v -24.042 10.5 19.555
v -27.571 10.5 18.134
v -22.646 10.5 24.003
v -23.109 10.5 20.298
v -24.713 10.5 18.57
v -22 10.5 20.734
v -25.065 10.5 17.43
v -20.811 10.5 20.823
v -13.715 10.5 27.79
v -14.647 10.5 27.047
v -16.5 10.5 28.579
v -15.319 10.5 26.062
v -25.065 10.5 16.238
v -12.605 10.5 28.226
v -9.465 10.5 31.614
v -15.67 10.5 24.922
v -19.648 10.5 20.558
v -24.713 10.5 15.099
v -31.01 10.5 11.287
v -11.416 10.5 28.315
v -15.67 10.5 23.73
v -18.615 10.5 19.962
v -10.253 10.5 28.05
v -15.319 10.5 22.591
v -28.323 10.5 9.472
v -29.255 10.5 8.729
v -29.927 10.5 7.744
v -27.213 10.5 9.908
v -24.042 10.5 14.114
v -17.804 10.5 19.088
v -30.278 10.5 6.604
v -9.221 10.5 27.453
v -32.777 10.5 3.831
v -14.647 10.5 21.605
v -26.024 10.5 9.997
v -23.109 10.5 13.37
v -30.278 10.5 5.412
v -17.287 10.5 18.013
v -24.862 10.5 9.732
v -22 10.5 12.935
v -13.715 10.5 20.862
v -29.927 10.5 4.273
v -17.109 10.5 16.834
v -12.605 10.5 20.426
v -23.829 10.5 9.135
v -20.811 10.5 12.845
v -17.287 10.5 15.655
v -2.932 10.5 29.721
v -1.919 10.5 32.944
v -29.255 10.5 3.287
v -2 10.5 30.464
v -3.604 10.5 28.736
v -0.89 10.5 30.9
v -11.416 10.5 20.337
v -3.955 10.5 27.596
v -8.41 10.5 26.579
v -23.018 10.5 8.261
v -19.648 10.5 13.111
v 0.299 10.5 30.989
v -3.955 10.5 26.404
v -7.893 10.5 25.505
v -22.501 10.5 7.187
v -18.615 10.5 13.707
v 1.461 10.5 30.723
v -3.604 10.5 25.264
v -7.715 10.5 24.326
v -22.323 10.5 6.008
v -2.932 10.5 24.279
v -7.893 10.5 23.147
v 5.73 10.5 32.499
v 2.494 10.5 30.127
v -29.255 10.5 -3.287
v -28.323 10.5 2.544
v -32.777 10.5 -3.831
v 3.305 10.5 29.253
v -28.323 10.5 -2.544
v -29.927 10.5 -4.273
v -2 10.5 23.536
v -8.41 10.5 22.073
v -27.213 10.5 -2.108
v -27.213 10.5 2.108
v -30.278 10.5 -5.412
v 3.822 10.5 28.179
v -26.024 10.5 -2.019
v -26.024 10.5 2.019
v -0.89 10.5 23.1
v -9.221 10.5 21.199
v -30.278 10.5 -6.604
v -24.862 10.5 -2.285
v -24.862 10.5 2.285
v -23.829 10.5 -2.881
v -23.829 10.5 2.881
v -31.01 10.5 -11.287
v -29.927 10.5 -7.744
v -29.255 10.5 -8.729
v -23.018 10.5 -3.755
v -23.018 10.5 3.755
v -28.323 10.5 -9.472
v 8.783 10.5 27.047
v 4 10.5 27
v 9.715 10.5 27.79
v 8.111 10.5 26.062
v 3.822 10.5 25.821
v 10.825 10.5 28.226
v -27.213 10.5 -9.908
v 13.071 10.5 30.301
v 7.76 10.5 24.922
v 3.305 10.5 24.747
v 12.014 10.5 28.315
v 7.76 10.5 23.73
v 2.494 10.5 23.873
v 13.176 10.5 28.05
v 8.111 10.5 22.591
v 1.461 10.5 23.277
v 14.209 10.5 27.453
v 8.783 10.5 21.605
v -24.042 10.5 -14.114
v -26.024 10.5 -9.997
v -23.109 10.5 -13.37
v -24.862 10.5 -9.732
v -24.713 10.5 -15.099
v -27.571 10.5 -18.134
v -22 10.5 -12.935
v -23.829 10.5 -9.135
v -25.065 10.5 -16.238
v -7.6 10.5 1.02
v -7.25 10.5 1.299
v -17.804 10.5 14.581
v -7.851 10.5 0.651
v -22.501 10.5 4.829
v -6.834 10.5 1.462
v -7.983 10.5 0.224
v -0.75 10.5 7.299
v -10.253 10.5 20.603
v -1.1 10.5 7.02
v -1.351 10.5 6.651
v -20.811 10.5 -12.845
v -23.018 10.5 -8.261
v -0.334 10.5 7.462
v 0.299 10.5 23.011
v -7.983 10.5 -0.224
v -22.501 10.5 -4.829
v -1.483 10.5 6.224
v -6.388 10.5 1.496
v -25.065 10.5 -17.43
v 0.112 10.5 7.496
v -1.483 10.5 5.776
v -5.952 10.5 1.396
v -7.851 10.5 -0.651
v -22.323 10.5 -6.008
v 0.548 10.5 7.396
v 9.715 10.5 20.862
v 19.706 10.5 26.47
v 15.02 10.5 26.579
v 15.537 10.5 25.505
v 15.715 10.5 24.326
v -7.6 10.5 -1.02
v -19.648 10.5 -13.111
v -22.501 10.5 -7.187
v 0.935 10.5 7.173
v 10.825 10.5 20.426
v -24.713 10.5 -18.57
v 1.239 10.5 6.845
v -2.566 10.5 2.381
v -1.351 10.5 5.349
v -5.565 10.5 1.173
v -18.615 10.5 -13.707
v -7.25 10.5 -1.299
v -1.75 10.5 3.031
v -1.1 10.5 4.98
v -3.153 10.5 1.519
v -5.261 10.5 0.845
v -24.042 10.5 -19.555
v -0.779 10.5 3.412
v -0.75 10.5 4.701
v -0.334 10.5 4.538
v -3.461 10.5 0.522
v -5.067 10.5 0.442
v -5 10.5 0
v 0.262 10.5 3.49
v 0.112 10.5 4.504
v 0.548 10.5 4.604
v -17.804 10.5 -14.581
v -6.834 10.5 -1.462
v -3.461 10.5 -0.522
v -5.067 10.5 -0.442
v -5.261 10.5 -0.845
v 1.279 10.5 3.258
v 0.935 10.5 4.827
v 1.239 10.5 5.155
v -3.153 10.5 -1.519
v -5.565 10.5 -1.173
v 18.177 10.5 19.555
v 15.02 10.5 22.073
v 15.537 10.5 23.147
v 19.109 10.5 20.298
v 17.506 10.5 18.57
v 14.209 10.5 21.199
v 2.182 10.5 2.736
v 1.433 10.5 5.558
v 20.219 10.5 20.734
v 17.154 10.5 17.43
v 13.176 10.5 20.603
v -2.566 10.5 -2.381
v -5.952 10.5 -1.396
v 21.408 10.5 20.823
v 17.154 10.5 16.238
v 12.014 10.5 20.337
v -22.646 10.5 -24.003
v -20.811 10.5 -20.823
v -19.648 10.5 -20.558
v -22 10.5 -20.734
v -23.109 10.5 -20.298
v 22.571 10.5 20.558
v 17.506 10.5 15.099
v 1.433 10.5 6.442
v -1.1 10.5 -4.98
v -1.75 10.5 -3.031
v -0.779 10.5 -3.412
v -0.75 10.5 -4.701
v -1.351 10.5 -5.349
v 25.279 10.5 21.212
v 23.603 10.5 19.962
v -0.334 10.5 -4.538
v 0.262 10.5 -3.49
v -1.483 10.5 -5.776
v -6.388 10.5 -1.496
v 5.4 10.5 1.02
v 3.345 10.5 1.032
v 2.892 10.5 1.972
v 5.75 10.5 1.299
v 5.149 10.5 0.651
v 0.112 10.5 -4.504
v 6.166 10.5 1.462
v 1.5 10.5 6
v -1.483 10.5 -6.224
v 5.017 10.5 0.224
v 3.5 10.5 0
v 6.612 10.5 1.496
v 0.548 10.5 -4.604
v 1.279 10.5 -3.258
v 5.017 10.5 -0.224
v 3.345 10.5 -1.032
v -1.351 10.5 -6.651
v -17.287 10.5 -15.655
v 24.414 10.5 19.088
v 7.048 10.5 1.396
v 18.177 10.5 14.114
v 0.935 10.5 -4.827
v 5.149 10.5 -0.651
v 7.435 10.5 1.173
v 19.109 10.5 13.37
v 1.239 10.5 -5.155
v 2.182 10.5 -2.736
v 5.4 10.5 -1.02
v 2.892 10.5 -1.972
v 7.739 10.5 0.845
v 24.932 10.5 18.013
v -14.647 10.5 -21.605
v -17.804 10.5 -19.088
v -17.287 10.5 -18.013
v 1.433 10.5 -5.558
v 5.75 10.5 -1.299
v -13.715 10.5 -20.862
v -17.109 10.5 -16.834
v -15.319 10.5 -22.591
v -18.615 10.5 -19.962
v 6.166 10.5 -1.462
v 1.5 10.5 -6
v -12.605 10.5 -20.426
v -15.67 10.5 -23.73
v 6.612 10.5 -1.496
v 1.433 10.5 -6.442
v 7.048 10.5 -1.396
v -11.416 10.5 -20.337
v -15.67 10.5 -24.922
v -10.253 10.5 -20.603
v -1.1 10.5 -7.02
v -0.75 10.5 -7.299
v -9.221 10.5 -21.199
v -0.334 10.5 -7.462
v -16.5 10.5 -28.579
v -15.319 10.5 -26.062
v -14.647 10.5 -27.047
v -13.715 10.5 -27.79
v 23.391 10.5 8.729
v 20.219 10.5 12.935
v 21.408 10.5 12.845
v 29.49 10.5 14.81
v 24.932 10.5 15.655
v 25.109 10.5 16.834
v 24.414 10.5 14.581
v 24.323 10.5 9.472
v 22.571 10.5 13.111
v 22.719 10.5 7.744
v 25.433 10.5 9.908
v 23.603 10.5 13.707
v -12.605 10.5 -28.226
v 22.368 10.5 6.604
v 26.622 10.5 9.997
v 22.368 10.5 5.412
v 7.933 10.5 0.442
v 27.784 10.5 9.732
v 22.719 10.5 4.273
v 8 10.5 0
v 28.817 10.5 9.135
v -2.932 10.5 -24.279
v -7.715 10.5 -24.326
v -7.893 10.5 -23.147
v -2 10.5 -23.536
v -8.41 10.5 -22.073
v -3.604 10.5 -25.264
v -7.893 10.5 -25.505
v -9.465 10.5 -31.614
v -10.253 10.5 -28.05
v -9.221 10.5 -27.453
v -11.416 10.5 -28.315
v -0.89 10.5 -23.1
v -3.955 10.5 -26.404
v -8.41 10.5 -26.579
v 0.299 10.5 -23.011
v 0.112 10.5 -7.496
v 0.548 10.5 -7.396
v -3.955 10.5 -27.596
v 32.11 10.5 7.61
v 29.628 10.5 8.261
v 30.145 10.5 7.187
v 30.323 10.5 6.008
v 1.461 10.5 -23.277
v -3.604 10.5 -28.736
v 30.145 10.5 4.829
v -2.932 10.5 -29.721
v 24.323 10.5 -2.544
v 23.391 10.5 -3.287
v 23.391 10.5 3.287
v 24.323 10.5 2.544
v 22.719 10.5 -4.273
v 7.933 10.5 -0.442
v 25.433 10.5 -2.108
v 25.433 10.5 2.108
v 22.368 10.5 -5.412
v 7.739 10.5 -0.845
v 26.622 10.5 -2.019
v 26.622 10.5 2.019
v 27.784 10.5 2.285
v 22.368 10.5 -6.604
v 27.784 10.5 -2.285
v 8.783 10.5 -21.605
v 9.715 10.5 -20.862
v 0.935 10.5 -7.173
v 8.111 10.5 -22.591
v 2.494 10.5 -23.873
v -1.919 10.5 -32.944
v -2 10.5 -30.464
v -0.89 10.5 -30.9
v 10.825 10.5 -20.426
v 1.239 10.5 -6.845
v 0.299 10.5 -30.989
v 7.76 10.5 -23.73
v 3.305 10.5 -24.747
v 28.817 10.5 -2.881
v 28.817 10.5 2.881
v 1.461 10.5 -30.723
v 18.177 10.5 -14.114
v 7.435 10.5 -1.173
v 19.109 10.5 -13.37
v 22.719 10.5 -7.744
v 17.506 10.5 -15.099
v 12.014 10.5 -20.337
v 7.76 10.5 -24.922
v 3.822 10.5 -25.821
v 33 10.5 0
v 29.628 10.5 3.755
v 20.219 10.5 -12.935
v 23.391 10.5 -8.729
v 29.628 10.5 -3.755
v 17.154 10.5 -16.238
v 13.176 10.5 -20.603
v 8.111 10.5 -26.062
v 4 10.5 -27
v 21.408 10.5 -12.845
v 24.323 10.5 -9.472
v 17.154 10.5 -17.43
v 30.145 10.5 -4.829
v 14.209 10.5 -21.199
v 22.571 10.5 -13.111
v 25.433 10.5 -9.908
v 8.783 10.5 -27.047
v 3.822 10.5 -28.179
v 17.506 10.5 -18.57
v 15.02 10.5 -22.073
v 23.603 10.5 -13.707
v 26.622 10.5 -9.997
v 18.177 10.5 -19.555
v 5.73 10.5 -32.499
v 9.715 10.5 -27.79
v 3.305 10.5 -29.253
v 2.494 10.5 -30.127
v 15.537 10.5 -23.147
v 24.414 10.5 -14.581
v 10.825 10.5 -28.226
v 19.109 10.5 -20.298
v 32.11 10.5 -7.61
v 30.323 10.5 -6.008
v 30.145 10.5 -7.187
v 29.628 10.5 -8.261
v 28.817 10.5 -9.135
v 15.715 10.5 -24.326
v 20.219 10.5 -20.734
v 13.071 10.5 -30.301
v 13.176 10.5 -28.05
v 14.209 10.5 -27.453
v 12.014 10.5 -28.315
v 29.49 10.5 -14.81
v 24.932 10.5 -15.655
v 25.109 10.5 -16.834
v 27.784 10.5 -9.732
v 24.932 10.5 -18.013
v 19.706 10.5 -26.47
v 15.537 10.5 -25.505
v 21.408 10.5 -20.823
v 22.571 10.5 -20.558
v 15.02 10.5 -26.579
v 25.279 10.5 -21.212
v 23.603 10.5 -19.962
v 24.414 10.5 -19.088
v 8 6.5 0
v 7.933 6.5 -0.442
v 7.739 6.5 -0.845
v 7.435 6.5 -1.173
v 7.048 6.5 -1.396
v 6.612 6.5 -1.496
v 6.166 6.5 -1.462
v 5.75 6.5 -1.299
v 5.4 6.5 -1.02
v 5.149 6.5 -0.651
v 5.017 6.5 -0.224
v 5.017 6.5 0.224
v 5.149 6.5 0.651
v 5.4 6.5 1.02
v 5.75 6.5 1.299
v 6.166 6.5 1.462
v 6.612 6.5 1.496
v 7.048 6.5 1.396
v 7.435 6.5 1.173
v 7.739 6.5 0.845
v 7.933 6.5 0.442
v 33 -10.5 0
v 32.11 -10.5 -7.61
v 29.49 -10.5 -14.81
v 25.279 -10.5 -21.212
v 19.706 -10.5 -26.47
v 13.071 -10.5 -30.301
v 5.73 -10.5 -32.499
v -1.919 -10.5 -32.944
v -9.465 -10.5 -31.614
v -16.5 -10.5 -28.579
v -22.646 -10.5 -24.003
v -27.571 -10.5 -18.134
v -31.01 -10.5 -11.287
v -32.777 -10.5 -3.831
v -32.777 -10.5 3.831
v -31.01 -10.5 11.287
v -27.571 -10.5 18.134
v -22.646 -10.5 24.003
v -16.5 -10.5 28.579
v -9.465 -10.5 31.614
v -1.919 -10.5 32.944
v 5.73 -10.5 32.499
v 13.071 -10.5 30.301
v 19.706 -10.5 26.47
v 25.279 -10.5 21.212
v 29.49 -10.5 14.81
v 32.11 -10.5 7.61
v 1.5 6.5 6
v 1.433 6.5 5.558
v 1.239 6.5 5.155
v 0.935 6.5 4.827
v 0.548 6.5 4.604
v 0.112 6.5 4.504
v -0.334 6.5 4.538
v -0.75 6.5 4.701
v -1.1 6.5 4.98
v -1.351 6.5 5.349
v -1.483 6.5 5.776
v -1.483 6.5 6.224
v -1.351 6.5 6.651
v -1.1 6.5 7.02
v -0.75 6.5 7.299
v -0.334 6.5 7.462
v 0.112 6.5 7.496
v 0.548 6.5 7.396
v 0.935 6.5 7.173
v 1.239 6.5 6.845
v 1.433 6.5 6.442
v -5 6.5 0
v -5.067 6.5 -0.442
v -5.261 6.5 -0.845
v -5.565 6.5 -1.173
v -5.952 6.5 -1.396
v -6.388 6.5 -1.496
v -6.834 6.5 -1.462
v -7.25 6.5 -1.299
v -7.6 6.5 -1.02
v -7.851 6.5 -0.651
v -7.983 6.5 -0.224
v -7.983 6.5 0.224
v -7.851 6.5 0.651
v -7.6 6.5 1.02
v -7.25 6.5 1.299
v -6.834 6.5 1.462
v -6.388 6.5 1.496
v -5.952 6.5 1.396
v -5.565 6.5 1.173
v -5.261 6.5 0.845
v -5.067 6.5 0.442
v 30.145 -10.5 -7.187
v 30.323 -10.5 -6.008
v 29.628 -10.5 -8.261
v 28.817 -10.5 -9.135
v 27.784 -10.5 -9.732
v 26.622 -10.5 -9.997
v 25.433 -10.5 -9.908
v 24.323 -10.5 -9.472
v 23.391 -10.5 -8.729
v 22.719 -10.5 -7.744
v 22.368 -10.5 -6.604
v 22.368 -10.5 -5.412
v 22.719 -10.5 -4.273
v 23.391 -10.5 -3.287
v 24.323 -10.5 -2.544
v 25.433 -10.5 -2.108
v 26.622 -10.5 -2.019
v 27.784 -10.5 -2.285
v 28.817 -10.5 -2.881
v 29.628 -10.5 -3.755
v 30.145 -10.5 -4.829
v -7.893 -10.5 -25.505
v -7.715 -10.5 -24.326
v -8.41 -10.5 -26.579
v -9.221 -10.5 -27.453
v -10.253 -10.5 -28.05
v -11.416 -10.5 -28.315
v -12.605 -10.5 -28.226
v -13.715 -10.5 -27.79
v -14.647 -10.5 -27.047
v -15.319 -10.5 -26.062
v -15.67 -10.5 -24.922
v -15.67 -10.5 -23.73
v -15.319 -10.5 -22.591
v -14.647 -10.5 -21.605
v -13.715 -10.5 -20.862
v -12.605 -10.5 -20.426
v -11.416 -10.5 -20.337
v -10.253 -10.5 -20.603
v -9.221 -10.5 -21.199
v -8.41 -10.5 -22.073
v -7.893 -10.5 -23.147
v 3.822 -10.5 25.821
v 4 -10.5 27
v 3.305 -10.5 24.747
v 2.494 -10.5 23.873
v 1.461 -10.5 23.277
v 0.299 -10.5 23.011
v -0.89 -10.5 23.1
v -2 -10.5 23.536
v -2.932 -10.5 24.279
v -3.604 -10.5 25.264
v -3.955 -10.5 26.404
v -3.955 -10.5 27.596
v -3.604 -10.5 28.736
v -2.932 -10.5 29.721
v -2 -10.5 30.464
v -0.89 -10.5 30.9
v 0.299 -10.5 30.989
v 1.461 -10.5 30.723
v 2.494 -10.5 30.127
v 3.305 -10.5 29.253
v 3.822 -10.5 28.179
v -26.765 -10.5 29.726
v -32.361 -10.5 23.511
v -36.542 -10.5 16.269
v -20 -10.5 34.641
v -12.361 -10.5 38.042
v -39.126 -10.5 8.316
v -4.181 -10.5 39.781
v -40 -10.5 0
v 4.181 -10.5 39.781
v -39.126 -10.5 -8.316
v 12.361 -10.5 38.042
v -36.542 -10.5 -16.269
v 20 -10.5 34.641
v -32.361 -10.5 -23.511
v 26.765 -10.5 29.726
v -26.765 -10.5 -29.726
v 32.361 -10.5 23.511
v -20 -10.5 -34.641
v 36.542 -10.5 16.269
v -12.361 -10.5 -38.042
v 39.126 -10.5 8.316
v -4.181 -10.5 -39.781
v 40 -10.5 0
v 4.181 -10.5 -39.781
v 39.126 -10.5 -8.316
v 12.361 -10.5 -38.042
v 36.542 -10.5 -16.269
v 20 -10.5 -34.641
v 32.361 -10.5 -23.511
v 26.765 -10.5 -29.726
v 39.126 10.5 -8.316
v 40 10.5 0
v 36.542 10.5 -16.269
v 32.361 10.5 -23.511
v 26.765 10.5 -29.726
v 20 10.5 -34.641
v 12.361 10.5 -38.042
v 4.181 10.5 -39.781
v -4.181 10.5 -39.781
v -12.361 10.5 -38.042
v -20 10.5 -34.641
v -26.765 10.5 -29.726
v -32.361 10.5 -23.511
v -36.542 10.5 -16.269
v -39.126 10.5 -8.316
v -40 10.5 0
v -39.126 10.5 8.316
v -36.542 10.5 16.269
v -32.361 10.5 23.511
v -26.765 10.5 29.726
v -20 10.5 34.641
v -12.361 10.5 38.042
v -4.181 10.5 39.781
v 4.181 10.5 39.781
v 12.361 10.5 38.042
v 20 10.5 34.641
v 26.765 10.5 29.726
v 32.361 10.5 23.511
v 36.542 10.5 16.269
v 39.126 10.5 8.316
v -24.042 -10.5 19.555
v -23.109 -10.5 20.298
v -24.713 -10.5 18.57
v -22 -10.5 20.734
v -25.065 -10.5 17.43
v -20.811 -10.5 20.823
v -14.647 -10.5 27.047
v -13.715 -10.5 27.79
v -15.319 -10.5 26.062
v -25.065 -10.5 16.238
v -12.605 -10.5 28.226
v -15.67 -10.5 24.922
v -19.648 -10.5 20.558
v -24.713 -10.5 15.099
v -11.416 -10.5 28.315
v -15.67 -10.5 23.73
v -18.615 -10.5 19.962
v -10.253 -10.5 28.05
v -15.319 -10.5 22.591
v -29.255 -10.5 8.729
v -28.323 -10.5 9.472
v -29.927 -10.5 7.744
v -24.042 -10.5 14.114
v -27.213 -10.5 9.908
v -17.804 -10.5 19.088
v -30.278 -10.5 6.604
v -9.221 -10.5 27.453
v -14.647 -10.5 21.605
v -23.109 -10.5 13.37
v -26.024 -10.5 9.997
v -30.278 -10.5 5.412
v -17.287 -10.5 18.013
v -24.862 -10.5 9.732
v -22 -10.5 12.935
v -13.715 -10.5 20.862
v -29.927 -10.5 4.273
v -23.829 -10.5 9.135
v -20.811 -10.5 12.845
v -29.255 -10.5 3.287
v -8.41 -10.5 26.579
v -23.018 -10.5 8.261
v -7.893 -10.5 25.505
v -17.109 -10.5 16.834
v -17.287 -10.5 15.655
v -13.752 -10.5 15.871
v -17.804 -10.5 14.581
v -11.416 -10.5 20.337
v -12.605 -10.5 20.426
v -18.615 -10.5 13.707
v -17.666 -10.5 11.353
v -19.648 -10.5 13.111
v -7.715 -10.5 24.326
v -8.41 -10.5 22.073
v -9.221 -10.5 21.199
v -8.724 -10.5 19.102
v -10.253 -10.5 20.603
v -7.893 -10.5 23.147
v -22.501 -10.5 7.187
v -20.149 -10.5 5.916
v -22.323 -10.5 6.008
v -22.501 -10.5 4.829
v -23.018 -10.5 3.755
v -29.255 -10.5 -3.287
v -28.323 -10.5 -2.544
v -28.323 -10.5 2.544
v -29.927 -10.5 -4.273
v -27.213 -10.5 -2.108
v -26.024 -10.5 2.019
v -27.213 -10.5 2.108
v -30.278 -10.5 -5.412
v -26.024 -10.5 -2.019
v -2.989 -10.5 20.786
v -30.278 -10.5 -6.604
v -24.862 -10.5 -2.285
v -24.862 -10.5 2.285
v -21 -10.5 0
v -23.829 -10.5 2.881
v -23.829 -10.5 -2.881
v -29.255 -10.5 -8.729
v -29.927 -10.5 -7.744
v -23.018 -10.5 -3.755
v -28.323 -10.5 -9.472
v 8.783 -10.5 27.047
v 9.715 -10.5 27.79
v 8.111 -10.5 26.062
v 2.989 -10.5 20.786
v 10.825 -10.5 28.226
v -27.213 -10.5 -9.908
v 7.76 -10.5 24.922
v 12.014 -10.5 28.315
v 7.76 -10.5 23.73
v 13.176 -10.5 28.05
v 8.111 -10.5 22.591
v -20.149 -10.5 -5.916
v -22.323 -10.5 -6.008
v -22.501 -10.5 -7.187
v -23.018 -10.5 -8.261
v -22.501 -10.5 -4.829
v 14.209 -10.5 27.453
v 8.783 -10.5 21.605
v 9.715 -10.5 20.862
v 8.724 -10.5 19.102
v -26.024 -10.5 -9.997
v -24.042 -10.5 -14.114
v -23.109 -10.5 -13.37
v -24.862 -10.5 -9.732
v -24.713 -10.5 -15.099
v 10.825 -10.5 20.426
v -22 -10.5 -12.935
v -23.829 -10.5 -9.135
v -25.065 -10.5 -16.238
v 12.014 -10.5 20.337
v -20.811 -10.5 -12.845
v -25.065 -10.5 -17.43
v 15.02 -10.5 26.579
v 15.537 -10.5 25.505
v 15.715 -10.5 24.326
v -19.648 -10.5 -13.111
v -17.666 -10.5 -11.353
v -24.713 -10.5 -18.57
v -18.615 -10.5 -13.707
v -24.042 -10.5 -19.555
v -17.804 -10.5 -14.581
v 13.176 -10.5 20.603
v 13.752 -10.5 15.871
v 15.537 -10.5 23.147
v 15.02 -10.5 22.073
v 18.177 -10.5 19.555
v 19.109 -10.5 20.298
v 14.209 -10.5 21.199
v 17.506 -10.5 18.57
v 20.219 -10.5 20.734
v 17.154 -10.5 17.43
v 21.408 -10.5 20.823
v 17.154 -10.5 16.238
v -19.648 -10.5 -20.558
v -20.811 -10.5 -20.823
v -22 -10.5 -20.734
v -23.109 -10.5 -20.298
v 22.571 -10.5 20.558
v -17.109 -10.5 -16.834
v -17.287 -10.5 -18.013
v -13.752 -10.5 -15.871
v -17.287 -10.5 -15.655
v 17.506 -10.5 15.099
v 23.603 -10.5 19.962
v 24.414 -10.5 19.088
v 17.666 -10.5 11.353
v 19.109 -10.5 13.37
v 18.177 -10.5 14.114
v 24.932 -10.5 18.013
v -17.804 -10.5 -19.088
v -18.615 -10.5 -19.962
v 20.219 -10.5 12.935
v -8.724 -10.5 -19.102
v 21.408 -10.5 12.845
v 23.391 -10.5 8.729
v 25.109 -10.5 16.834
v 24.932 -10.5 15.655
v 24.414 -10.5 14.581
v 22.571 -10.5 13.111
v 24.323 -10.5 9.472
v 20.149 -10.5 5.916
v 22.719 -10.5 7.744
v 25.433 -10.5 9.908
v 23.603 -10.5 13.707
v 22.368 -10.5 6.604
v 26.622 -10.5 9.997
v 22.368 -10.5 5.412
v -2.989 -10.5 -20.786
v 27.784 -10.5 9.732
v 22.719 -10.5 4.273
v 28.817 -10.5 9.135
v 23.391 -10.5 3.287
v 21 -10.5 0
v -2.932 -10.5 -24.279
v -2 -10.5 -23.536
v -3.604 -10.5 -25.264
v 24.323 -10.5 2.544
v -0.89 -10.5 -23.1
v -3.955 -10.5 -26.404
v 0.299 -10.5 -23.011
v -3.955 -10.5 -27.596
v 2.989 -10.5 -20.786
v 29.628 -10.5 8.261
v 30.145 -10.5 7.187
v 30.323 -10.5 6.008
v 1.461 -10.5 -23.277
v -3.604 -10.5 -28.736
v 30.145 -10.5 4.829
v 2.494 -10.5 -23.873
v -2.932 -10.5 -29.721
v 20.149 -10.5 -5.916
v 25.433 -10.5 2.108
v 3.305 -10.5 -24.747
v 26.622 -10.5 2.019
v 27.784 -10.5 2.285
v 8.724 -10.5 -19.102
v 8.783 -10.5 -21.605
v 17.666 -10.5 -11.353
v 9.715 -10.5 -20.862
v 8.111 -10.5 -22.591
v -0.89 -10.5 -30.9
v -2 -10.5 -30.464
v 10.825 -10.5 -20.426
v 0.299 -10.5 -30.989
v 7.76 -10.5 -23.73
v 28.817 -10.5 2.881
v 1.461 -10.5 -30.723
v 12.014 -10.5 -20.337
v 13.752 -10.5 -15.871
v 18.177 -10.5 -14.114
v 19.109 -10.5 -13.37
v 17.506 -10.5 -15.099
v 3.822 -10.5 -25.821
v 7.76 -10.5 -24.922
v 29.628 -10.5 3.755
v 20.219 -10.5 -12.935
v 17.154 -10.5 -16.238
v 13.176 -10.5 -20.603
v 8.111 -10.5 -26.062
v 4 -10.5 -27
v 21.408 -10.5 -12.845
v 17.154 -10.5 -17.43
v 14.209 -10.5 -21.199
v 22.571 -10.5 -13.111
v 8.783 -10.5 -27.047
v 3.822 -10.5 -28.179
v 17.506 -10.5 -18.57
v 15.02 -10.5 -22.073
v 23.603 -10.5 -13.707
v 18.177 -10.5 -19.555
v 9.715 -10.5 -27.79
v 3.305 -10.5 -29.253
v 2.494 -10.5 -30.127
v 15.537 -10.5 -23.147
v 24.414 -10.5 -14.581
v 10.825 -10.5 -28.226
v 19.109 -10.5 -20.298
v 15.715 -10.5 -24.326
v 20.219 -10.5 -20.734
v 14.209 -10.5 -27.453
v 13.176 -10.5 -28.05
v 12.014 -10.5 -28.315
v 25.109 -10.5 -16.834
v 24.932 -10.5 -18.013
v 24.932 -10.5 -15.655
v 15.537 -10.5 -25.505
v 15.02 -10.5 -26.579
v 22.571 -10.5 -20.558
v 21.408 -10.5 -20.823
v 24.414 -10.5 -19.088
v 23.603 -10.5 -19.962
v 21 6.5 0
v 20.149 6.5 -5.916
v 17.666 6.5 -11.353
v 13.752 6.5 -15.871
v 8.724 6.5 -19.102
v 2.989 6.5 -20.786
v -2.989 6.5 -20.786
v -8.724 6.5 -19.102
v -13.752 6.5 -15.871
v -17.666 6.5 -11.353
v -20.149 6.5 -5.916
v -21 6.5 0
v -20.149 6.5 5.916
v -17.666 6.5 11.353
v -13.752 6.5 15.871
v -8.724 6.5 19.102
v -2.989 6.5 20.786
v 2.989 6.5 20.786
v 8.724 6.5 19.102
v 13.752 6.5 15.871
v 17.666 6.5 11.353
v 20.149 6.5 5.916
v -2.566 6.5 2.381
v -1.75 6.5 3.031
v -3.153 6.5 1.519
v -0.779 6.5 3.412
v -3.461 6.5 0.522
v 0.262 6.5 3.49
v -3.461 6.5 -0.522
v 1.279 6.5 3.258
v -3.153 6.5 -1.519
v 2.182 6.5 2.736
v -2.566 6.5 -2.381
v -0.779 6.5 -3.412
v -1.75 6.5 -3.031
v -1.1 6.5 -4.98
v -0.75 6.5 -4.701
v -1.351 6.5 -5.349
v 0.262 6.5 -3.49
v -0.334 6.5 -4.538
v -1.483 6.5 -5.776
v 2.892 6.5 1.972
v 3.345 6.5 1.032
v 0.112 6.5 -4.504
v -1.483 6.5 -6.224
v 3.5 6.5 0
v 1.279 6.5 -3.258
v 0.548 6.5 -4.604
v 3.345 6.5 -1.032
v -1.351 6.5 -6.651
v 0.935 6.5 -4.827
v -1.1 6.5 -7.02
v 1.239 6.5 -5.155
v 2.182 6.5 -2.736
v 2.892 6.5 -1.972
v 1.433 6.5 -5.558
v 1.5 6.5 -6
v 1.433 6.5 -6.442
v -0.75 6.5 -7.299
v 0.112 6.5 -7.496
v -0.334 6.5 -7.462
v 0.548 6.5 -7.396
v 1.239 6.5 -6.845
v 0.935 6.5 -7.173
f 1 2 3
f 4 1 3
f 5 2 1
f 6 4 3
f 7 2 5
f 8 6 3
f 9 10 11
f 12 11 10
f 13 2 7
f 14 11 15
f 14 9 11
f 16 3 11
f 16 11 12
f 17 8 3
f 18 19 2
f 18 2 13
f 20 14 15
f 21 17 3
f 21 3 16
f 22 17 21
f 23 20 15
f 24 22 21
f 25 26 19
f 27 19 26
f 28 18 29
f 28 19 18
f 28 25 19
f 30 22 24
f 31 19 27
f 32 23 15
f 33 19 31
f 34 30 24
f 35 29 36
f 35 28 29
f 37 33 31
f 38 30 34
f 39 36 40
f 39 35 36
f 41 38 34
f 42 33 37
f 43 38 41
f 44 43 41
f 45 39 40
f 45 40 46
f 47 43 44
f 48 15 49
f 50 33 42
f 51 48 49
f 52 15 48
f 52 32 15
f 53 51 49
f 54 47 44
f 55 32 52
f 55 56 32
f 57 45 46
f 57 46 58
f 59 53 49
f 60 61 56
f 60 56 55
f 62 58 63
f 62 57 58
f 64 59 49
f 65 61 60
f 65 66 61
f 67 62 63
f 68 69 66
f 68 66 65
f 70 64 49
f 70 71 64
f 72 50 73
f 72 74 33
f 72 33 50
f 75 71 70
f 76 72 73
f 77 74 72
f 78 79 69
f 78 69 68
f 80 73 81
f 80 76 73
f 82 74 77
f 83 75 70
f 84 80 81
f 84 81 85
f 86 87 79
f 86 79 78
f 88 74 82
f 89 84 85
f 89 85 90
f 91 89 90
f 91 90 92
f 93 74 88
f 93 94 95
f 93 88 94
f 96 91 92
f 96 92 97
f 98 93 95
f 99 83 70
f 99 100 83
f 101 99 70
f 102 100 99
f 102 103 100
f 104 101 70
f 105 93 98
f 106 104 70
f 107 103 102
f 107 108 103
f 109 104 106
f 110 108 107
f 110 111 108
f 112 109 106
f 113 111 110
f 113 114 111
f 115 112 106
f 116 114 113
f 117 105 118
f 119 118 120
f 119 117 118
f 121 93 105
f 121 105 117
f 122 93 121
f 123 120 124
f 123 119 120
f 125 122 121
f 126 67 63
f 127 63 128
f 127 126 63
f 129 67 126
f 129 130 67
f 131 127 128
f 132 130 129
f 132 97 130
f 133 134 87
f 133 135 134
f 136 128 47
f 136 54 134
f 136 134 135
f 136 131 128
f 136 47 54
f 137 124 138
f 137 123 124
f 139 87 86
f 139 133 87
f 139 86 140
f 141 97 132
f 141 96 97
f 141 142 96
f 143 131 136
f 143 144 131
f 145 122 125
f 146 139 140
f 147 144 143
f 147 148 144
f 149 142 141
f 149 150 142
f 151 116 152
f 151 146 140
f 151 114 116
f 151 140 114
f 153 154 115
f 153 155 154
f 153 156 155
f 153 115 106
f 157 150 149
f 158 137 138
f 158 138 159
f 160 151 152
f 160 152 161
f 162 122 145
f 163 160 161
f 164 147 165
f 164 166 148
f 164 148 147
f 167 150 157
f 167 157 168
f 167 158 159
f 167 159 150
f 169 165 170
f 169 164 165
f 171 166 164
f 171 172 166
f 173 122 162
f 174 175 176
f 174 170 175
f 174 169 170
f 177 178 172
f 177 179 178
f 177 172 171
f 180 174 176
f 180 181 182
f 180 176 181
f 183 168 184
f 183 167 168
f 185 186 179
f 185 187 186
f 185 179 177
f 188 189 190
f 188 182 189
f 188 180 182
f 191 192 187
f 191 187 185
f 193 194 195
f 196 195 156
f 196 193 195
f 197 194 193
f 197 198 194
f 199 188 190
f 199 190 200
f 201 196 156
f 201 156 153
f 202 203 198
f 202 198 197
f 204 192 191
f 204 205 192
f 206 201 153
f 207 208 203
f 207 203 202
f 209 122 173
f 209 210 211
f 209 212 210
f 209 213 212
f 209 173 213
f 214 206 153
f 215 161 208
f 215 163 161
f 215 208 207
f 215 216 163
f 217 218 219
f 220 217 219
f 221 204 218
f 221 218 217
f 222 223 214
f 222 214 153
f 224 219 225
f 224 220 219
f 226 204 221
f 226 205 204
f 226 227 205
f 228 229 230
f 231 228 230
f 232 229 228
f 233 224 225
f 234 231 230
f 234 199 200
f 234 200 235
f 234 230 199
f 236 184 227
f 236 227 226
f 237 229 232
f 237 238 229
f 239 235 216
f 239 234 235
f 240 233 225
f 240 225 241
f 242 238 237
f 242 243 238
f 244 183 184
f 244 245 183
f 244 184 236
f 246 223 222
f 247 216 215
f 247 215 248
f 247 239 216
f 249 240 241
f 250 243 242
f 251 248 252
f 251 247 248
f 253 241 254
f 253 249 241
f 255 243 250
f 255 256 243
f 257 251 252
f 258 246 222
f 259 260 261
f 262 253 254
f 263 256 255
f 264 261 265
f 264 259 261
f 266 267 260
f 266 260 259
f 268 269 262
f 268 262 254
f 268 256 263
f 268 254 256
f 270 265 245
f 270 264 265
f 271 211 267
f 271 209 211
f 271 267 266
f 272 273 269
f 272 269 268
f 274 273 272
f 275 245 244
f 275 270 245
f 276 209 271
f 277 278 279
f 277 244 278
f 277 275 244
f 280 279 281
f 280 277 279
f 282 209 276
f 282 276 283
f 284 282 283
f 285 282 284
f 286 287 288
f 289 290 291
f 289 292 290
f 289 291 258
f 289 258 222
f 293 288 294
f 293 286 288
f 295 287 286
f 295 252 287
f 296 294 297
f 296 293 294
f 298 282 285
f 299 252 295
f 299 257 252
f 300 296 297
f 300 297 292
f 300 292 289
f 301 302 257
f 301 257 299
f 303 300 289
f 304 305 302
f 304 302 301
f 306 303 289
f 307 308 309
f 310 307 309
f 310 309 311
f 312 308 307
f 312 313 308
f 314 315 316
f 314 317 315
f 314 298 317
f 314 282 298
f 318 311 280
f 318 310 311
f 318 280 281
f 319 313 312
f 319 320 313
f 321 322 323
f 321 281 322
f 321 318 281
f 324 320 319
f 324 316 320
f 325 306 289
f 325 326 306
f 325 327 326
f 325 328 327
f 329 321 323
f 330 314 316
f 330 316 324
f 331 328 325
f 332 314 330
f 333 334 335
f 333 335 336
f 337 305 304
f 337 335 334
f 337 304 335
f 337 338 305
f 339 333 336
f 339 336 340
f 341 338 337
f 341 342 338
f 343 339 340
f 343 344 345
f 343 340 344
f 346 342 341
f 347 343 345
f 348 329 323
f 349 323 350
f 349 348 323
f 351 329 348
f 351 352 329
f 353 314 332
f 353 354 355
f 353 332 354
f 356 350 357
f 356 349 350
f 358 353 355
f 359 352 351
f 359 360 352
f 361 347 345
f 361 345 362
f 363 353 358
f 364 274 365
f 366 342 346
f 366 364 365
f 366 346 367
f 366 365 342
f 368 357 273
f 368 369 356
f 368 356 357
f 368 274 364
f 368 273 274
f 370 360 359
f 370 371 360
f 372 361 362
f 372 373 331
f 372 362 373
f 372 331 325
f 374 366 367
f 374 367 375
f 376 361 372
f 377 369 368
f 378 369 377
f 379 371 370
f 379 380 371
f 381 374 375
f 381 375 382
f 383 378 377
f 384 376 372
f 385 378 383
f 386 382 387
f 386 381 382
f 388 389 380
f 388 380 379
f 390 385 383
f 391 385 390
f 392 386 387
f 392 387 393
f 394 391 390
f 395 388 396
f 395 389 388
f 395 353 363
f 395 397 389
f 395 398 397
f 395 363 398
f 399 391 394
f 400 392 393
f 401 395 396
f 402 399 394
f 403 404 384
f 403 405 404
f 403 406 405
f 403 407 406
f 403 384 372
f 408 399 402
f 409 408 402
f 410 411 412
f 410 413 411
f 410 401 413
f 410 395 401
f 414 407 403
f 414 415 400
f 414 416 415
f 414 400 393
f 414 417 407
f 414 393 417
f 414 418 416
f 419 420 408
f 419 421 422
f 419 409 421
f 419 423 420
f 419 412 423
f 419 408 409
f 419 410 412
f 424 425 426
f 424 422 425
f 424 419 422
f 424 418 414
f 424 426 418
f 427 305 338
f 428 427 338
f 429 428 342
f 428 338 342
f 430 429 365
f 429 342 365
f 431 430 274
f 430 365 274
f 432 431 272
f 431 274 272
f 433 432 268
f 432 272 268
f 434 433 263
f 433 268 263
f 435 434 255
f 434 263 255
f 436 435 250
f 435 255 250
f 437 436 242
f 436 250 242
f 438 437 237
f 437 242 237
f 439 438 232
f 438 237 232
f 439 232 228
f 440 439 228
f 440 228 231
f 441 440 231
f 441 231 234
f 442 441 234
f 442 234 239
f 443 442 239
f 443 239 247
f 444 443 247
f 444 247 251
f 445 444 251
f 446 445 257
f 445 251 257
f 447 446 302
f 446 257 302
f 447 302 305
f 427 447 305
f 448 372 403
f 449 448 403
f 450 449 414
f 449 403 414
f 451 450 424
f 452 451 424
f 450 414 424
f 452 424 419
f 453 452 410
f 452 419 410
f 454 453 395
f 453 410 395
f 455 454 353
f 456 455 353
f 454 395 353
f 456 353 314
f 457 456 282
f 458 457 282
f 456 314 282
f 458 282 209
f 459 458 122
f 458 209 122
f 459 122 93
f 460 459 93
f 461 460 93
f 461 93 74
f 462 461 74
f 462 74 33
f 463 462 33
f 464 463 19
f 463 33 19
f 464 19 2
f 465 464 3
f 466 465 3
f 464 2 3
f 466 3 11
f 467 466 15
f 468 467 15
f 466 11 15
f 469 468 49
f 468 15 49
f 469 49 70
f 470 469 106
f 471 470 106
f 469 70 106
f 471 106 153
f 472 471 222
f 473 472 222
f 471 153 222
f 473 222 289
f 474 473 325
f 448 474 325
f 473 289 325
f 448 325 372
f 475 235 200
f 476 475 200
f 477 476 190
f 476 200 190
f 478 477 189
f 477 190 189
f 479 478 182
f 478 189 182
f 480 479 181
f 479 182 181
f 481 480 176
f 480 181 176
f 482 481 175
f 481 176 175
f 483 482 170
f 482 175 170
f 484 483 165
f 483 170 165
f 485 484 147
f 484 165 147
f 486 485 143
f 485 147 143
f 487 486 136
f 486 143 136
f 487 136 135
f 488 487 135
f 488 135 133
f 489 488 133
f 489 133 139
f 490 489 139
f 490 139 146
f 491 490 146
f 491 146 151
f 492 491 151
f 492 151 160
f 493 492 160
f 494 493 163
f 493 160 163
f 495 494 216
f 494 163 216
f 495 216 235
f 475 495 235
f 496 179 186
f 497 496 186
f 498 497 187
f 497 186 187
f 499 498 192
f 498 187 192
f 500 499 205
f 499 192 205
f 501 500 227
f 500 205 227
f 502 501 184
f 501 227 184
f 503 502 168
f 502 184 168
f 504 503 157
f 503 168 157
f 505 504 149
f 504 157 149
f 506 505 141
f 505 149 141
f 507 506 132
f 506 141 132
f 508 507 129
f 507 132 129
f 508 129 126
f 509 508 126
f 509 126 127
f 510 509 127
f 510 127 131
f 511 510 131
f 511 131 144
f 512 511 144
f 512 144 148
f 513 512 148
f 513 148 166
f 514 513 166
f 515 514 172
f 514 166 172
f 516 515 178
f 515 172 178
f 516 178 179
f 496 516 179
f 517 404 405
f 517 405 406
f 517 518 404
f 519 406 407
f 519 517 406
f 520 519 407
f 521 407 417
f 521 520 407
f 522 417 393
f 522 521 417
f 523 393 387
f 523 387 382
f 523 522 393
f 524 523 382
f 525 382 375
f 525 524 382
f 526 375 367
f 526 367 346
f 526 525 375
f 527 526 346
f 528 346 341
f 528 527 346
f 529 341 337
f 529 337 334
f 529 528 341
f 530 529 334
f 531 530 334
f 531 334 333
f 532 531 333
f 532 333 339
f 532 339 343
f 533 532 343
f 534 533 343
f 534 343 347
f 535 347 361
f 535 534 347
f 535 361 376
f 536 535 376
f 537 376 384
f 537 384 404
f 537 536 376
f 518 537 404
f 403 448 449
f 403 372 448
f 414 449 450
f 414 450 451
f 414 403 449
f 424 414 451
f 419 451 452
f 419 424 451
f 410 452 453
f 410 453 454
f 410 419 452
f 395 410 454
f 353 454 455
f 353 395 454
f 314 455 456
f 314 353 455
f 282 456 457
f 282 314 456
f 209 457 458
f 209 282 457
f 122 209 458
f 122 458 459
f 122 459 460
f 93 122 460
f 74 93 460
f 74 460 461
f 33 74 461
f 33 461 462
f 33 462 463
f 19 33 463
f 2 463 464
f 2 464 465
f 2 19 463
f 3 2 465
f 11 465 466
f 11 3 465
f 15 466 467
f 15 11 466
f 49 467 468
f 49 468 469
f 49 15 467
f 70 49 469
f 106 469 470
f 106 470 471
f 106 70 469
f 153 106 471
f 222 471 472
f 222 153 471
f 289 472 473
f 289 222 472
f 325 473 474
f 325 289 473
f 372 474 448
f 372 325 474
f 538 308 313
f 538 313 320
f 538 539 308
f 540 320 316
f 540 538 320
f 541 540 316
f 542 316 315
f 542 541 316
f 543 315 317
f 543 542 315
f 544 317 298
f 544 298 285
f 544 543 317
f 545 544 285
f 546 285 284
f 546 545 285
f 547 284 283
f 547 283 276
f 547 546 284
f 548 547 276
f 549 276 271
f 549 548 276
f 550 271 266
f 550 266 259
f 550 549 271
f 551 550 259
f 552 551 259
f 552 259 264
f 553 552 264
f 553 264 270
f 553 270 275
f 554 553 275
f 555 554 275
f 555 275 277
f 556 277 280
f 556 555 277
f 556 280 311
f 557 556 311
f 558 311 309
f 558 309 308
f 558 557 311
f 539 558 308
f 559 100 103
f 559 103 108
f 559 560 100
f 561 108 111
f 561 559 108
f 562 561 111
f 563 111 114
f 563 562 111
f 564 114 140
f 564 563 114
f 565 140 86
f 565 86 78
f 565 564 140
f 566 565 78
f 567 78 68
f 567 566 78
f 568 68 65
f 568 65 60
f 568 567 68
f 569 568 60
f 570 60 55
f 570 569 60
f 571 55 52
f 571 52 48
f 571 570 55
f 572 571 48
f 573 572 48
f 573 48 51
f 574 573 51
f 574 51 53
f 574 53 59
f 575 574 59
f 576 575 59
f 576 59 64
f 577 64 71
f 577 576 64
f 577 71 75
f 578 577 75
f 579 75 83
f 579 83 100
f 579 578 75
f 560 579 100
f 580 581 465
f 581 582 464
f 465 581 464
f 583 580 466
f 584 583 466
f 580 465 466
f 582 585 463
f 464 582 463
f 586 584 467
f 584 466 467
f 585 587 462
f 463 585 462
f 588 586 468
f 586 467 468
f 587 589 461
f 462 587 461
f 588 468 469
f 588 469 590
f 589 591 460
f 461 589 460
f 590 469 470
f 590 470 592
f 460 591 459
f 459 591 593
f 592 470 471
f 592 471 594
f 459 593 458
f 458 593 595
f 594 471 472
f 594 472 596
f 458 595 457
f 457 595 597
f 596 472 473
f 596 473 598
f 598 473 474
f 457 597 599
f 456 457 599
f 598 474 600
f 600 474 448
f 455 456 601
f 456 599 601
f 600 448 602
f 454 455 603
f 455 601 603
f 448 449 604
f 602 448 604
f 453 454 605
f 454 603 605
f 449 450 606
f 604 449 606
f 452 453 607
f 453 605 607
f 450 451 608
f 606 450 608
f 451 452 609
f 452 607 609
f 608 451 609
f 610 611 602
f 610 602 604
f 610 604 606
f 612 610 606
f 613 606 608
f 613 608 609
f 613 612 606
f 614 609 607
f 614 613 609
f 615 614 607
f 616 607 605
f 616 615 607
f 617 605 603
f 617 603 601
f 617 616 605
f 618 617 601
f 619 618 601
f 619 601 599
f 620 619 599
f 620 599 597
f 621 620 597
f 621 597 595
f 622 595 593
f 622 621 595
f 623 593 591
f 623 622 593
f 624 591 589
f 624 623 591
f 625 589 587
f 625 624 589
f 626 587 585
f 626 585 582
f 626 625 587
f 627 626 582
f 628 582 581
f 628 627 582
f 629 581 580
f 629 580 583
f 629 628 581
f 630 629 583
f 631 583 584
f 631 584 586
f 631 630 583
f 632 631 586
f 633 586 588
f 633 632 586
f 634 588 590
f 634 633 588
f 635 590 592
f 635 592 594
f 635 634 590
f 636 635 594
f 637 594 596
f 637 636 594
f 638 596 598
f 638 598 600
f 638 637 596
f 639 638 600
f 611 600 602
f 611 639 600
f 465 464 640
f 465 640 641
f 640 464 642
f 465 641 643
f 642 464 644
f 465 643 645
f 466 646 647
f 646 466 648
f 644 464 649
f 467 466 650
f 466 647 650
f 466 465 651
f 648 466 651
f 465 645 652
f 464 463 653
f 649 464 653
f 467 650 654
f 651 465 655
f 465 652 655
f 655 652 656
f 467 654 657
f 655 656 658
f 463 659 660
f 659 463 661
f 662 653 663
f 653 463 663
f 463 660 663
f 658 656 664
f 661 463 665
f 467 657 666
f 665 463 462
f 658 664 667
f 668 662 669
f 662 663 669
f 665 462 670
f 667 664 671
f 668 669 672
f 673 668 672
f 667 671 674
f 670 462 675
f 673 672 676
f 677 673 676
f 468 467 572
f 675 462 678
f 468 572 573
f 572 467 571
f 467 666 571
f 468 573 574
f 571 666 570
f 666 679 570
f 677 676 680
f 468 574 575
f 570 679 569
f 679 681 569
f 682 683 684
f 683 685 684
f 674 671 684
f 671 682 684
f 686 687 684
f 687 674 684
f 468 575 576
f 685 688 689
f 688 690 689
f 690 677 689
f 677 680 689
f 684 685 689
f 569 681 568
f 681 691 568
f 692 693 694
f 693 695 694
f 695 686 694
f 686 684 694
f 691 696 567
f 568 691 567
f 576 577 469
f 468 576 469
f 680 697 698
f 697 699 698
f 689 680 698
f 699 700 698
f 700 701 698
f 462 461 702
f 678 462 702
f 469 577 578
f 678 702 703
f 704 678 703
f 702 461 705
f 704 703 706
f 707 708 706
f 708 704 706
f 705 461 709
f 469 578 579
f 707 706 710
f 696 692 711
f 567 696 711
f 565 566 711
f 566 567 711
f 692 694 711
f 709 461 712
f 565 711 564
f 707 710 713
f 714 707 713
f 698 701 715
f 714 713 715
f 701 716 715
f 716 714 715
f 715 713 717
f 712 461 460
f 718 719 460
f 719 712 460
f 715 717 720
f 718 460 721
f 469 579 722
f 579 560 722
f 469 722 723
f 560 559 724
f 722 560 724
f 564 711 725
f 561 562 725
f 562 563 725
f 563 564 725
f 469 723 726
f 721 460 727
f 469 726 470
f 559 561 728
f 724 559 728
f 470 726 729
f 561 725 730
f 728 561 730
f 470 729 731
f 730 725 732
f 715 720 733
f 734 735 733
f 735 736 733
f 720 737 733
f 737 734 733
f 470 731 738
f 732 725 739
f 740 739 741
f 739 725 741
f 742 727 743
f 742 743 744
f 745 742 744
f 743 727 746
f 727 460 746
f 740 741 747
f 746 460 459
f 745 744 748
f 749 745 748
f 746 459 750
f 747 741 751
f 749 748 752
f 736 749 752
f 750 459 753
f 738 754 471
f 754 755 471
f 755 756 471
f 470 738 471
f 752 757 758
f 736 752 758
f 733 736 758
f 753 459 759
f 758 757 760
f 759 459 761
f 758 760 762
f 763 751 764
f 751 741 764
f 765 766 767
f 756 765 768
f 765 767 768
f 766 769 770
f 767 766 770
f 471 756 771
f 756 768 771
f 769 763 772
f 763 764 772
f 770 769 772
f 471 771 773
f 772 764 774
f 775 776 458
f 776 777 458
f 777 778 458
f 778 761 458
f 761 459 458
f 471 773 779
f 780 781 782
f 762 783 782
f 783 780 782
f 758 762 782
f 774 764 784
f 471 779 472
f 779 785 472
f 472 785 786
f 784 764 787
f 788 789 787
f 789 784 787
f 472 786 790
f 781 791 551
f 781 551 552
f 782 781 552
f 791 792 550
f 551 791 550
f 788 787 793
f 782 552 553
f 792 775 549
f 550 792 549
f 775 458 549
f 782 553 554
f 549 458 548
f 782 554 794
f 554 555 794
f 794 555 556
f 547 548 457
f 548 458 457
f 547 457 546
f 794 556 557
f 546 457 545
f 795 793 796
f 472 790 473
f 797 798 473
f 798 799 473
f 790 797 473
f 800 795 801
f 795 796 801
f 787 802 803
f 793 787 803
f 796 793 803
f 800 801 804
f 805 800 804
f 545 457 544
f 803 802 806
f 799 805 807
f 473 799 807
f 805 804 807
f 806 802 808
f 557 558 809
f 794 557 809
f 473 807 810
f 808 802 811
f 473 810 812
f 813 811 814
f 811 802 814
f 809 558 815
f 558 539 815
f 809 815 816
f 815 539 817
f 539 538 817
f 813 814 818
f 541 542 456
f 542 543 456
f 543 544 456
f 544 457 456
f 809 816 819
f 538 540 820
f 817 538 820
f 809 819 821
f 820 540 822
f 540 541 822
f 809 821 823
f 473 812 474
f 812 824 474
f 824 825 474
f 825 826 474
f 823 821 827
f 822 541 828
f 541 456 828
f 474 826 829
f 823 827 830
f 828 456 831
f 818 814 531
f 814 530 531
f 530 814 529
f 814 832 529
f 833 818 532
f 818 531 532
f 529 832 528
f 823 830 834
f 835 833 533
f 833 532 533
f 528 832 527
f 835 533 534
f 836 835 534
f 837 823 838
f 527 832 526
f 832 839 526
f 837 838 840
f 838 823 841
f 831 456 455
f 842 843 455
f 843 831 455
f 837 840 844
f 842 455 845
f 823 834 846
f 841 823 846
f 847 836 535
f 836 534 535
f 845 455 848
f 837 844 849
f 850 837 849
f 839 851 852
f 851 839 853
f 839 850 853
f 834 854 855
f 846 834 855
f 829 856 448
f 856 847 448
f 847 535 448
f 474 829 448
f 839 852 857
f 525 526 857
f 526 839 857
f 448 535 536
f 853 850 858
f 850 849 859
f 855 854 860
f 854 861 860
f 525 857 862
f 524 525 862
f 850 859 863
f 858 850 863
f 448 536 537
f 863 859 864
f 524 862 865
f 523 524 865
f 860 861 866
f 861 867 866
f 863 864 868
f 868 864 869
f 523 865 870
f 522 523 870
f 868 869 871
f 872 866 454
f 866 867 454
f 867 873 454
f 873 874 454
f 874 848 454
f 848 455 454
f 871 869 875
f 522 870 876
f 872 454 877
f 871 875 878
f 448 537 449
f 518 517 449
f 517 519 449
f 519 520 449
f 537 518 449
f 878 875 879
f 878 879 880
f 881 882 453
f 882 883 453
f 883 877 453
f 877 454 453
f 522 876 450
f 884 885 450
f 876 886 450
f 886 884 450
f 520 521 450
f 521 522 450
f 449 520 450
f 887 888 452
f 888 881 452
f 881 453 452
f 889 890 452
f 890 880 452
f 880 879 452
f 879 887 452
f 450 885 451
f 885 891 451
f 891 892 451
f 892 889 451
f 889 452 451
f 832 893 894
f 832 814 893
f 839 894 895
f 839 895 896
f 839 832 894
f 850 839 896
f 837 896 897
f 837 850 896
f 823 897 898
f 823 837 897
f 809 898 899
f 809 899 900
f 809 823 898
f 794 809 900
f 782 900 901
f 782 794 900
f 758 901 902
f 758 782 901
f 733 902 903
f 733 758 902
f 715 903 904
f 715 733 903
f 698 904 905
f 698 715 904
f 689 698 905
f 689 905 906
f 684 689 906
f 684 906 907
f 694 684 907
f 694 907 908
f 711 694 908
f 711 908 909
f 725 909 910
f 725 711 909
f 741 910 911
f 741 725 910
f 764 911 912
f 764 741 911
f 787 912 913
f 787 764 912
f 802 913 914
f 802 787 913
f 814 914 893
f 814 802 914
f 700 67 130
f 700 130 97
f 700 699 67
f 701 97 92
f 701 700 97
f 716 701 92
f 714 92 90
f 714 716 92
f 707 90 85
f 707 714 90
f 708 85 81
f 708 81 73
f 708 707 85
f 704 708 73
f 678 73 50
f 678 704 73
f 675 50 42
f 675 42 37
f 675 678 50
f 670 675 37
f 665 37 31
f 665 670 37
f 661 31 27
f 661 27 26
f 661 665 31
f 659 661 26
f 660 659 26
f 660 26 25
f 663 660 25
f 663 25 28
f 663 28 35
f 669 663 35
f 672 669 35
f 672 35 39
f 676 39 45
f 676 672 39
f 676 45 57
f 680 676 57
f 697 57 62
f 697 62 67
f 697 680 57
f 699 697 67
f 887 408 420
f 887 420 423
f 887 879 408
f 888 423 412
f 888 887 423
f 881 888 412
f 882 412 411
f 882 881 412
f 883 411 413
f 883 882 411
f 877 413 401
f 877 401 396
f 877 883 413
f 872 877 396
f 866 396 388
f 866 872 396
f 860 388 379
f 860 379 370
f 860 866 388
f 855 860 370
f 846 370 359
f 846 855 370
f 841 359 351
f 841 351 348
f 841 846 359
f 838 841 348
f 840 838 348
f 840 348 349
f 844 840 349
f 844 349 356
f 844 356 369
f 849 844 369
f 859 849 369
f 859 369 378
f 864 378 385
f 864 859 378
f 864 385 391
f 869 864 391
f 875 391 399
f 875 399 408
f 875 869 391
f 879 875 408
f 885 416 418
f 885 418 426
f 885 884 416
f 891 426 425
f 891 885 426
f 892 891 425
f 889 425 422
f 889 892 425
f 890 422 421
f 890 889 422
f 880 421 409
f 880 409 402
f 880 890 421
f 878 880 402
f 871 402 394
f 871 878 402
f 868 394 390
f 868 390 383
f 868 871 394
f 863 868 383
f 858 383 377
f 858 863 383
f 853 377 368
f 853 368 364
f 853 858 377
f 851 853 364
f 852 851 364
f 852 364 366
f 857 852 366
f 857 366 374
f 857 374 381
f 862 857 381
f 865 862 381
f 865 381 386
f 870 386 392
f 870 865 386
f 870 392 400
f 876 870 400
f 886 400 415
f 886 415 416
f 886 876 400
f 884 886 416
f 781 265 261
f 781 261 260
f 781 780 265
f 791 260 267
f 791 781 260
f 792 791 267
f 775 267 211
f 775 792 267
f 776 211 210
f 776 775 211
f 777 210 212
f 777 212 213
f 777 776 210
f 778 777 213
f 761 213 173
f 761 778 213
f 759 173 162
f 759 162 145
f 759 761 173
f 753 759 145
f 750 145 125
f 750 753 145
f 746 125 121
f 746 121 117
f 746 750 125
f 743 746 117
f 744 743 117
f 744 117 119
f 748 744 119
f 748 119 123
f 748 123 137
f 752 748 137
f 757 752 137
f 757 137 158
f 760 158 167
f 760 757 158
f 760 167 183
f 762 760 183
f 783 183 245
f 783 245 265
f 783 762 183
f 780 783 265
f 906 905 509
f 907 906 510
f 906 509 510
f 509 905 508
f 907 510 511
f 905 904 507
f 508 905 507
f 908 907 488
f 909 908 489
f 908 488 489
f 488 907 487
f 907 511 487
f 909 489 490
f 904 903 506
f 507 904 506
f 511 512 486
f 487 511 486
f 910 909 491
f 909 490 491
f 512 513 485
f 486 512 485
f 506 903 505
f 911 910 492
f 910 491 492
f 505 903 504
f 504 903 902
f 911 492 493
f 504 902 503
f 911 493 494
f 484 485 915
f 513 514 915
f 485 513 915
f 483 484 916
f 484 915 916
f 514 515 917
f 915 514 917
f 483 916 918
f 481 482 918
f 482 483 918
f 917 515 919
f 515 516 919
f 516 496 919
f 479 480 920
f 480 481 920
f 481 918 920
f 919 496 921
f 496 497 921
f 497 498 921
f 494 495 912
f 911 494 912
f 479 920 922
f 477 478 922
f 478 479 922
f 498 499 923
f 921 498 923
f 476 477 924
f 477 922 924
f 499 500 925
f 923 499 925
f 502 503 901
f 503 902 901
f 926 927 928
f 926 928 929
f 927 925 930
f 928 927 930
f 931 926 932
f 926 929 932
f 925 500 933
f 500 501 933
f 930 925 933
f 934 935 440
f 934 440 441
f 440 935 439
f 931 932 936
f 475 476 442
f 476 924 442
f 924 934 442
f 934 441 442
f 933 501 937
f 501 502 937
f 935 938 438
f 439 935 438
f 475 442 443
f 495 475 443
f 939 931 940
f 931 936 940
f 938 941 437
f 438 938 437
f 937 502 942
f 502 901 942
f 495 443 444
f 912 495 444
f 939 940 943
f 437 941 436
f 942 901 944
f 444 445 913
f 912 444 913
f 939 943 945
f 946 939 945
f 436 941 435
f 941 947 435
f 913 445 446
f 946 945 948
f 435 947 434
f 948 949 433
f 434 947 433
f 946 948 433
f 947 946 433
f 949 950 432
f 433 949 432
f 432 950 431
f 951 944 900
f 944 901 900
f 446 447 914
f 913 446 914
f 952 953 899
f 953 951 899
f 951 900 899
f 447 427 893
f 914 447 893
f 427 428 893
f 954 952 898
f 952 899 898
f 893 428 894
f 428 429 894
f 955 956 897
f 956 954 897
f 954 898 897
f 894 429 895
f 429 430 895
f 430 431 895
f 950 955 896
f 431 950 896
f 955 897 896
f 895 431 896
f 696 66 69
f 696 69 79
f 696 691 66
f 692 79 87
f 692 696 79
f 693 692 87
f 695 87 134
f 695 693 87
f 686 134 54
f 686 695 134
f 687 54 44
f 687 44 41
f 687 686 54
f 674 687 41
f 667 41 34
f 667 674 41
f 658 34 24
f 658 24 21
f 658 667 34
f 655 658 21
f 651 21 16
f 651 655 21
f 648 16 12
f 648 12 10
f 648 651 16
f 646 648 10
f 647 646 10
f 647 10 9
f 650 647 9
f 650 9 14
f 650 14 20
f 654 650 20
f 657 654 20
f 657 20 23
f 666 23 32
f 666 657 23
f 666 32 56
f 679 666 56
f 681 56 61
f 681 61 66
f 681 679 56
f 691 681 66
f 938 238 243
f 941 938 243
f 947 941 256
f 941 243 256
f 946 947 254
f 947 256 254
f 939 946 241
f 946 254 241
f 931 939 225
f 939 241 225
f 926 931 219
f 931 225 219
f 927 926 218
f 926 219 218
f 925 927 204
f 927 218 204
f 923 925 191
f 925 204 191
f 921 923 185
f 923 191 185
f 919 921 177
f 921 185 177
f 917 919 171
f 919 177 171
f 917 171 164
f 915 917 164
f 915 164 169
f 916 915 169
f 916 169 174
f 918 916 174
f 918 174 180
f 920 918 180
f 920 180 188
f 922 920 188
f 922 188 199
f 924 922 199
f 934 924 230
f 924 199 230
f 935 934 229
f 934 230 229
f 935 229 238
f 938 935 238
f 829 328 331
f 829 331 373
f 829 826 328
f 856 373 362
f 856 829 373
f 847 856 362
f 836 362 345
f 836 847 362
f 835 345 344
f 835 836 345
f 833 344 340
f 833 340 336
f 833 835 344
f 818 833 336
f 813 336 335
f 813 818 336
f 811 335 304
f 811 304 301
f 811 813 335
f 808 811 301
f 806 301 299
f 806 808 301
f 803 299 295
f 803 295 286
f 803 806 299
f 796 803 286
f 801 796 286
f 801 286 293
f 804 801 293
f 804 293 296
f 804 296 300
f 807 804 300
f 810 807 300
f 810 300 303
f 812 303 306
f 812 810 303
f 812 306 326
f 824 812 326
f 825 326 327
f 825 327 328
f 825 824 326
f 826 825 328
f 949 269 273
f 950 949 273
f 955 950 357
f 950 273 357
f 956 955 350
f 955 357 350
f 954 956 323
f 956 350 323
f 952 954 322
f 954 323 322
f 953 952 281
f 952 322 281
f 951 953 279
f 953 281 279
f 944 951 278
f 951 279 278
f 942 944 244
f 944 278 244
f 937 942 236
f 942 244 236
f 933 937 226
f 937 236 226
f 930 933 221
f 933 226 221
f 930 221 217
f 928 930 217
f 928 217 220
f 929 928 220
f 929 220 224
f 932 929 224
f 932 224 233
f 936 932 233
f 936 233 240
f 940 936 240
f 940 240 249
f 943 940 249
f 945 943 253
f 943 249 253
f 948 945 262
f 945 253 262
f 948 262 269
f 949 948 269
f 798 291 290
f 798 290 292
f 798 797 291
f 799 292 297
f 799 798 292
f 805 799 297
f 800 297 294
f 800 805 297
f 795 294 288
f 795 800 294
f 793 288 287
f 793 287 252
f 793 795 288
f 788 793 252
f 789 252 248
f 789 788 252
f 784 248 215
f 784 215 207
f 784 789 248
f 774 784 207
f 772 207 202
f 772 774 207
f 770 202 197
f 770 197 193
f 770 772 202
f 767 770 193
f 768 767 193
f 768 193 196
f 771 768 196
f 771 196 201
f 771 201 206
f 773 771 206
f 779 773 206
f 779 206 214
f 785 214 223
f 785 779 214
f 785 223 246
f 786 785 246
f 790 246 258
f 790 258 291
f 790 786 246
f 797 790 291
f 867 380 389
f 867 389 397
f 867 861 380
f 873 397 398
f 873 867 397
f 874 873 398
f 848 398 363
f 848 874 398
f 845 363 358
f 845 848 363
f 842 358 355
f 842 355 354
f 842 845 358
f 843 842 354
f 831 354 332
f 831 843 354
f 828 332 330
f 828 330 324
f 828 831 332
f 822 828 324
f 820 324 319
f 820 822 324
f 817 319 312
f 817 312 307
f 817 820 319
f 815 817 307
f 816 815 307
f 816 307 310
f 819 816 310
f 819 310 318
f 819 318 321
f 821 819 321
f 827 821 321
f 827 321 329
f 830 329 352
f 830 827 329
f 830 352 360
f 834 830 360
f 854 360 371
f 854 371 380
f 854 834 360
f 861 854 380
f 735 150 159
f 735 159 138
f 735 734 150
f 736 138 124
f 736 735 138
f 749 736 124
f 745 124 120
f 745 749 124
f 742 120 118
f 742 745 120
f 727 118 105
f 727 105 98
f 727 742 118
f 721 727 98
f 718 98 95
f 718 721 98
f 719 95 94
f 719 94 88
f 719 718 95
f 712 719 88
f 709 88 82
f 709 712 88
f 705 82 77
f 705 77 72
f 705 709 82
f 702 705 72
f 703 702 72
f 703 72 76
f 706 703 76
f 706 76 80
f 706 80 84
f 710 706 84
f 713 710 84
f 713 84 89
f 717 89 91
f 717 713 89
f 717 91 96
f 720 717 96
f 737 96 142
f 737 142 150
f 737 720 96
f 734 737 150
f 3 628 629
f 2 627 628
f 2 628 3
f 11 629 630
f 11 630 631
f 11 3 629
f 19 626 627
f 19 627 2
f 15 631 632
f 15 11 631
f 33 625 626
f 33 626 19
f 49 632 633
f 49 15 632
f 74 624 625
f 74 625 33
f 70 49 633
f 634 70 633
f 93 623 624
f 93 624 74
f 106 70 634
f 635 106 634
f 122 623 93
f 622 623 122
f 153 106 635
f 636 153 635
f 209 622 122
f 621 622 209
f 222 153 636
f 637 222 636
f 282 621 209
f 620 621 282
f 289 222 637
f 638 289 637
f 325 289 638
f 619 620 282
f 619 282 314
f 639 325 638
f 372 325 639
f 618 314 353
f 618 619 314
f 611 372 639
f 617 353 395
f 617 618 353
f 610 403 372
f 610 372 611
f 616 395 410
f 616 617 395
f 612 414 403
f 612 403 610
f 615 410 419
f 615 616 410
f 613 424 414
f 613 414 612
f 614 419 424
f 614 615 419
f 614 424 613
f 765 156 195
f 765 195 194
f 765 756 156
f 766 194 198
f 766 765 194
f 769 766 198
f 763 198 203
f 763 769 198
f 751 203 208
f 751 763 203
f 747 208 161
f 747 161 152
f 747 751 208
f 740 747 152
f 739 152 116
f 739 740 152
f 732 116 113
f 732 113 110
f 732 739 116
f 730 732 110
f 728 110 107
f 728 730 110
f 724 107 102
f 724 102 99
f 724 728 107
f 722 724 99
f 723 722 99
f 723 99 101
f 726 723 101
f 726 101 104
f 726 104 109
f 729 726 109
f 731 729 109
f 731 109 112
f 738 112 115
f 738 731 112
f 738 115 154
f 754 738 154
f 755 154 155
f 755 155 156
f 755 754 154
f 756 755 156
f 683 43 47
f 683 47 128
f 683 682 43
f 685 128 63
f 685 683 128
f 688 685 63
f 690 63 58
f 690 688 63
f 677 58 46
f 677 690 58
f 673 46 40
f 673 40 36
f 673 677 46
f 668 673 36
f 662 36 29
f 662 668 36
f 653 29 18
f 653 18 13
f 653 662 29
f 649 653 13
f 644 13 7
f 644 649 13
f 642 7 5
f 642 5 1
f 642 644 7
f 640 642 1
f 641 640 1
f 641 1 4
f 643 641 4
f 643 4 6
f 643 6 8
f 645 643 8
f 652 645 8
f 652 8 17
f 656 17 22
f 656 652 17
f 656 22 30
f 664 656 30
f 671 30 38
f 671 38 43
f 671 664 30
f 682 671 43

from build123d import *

# Parameters (mm, degrees)
SKETCH_1_R      = 33
SKETCH_1_R_2    = 21
SKETCH_1_R_3    = 4
EXTRUDE_1_DEPTH = 10.5
SKETCH_2_R      = 21
SKETCH_2_R_2    = 1.5
SKETCH_2_R_3    = 3.5
EXTRUDE_2_DEPTH = 4
SKETCH_3_R      = 40
SKETCH_3_R_2    = 33
EXTRUDE_3_DEPTH = 21


with BuildPart() as part:
    # 草图1 → 凸台-拉伸1 (new body, symmetric)
    with BuildSketch(Plane(origin=(0, 0, 0), x_dir=(1, 0, 0), z_dir=(0, 1, 0))):
        Circle(SKETCH_1_R)
        Circle(SKETCH_1_R_2, mode=Mode.SUBTRACT)
        with Locations((0, 27)):
            Circle(SKETCH_1_R_3, mode=Mode.SUBTRACT)
        with Locations((11.714860956, 24.326159433)):
            Circle(SKETCH_1_R_3, mode=Mode.SUBTRACT)
        with Locations((21.109450027, 16.83422465)):
            Circle(SKETCH_1_R_3, mode=Mode.SUBTRACT)
        with Locations((26.323053629, 6.008065217)):
            Circle(SKETCH_1_R_3, mode=Mode.SUBTRACT)
        with Locations((26.323053629, -6.008065217)):
            Circle(SKETCH_1_R_3, mode=Mode.SUBTRACT)
        with Locations((21.109450027, -16.83422465)):
            Circle(SKETCH_1_R_3, mode=Mode.SUBTRACT)
        with Locations((11.714860956, -24.326159433)):
            Circle(SKETCH_1_R_3, mode=Mode.SUBTRACT)
        with Locations((0, -27)):
            Circle(SKETCH_1_R_3, mode=Mode.SUBTRACT)
        with Locations((-11.714860956, -24.326159433)):
            Circle(SKETCH_1_R_3, mode=Mode.SUBTRACT)
        with Locations((-21.109450027, -16.83422465)):
            Circle(SKETCH_1_R_3, mode=Mode.SUBTRACT)
        with Locations((-26.323053629, -6.008065217)):
            Circle(SKETCH_1_R_3, mode=Mode.SUBTRACT)
        with Locations((-26.323053629, 6.008065217)):
            Circle(SKETCH_1_R_3, mode=Mode.SUBTRACT)
        with Locations((-21.109450027, 16.83422465)):
            Circle(SKETCH_1_R_3, mode=Mode.SUBTRACT)
        with Locations((-11.714860956, 24.326159433)):
            Circle(SKETCH_1_R_3, mode=Mode.SUBTRACT)
    extrude(amount=EXTRUDE_1_DEPTH, both=True)

    # 草图2 → 凸台-拉伸2 (add)
    with BuildSketch(Plane(origin=(0, 10.5, 0), x_dir=(1, 0, 0), z_dir=(0, 1, 0))):
        Circle(SKETCH_2_R)
        with Locations((0, 6)):
            Circle(SKETCH_2_R_2, mode=Mode.SUBTRACT)
        with Locations((0, -6)):
            Circle(SKETCH_2_R_2, mode=Mode.SUBTRACT)
        with Locations((-6.5, 0)):
            Circle(SKETCH_2_R_2, mode=Mode.SUBTRACT)
        with Locations((6.5, 0)):
            Circle(SKETCH_2_R_2, mode=Mode.SUBTRACT)
        Circle(SKETCH_2_R_3, mode=Mode.SUBTRACT)
    extrude(amount=-EXTRUDE_2_DEPTH)


with BuildPart() as body_2:
    # 草图3 → 凸台-拉伸3 (new body)
    with BuildSketch(Plane(origin=(0, 10.5, 0), x_dir=(1, 0, 0), z_dir=(0, 1, 0))):
        Circle(SKETCH_3_R)
        Circle(SKETCH_3_R_2, mode=Mode.SUBTRACT)
    extrude(amount=-EXTRUDE_3_DEPTH)


solid = Compound([part.part, body_2.part])
